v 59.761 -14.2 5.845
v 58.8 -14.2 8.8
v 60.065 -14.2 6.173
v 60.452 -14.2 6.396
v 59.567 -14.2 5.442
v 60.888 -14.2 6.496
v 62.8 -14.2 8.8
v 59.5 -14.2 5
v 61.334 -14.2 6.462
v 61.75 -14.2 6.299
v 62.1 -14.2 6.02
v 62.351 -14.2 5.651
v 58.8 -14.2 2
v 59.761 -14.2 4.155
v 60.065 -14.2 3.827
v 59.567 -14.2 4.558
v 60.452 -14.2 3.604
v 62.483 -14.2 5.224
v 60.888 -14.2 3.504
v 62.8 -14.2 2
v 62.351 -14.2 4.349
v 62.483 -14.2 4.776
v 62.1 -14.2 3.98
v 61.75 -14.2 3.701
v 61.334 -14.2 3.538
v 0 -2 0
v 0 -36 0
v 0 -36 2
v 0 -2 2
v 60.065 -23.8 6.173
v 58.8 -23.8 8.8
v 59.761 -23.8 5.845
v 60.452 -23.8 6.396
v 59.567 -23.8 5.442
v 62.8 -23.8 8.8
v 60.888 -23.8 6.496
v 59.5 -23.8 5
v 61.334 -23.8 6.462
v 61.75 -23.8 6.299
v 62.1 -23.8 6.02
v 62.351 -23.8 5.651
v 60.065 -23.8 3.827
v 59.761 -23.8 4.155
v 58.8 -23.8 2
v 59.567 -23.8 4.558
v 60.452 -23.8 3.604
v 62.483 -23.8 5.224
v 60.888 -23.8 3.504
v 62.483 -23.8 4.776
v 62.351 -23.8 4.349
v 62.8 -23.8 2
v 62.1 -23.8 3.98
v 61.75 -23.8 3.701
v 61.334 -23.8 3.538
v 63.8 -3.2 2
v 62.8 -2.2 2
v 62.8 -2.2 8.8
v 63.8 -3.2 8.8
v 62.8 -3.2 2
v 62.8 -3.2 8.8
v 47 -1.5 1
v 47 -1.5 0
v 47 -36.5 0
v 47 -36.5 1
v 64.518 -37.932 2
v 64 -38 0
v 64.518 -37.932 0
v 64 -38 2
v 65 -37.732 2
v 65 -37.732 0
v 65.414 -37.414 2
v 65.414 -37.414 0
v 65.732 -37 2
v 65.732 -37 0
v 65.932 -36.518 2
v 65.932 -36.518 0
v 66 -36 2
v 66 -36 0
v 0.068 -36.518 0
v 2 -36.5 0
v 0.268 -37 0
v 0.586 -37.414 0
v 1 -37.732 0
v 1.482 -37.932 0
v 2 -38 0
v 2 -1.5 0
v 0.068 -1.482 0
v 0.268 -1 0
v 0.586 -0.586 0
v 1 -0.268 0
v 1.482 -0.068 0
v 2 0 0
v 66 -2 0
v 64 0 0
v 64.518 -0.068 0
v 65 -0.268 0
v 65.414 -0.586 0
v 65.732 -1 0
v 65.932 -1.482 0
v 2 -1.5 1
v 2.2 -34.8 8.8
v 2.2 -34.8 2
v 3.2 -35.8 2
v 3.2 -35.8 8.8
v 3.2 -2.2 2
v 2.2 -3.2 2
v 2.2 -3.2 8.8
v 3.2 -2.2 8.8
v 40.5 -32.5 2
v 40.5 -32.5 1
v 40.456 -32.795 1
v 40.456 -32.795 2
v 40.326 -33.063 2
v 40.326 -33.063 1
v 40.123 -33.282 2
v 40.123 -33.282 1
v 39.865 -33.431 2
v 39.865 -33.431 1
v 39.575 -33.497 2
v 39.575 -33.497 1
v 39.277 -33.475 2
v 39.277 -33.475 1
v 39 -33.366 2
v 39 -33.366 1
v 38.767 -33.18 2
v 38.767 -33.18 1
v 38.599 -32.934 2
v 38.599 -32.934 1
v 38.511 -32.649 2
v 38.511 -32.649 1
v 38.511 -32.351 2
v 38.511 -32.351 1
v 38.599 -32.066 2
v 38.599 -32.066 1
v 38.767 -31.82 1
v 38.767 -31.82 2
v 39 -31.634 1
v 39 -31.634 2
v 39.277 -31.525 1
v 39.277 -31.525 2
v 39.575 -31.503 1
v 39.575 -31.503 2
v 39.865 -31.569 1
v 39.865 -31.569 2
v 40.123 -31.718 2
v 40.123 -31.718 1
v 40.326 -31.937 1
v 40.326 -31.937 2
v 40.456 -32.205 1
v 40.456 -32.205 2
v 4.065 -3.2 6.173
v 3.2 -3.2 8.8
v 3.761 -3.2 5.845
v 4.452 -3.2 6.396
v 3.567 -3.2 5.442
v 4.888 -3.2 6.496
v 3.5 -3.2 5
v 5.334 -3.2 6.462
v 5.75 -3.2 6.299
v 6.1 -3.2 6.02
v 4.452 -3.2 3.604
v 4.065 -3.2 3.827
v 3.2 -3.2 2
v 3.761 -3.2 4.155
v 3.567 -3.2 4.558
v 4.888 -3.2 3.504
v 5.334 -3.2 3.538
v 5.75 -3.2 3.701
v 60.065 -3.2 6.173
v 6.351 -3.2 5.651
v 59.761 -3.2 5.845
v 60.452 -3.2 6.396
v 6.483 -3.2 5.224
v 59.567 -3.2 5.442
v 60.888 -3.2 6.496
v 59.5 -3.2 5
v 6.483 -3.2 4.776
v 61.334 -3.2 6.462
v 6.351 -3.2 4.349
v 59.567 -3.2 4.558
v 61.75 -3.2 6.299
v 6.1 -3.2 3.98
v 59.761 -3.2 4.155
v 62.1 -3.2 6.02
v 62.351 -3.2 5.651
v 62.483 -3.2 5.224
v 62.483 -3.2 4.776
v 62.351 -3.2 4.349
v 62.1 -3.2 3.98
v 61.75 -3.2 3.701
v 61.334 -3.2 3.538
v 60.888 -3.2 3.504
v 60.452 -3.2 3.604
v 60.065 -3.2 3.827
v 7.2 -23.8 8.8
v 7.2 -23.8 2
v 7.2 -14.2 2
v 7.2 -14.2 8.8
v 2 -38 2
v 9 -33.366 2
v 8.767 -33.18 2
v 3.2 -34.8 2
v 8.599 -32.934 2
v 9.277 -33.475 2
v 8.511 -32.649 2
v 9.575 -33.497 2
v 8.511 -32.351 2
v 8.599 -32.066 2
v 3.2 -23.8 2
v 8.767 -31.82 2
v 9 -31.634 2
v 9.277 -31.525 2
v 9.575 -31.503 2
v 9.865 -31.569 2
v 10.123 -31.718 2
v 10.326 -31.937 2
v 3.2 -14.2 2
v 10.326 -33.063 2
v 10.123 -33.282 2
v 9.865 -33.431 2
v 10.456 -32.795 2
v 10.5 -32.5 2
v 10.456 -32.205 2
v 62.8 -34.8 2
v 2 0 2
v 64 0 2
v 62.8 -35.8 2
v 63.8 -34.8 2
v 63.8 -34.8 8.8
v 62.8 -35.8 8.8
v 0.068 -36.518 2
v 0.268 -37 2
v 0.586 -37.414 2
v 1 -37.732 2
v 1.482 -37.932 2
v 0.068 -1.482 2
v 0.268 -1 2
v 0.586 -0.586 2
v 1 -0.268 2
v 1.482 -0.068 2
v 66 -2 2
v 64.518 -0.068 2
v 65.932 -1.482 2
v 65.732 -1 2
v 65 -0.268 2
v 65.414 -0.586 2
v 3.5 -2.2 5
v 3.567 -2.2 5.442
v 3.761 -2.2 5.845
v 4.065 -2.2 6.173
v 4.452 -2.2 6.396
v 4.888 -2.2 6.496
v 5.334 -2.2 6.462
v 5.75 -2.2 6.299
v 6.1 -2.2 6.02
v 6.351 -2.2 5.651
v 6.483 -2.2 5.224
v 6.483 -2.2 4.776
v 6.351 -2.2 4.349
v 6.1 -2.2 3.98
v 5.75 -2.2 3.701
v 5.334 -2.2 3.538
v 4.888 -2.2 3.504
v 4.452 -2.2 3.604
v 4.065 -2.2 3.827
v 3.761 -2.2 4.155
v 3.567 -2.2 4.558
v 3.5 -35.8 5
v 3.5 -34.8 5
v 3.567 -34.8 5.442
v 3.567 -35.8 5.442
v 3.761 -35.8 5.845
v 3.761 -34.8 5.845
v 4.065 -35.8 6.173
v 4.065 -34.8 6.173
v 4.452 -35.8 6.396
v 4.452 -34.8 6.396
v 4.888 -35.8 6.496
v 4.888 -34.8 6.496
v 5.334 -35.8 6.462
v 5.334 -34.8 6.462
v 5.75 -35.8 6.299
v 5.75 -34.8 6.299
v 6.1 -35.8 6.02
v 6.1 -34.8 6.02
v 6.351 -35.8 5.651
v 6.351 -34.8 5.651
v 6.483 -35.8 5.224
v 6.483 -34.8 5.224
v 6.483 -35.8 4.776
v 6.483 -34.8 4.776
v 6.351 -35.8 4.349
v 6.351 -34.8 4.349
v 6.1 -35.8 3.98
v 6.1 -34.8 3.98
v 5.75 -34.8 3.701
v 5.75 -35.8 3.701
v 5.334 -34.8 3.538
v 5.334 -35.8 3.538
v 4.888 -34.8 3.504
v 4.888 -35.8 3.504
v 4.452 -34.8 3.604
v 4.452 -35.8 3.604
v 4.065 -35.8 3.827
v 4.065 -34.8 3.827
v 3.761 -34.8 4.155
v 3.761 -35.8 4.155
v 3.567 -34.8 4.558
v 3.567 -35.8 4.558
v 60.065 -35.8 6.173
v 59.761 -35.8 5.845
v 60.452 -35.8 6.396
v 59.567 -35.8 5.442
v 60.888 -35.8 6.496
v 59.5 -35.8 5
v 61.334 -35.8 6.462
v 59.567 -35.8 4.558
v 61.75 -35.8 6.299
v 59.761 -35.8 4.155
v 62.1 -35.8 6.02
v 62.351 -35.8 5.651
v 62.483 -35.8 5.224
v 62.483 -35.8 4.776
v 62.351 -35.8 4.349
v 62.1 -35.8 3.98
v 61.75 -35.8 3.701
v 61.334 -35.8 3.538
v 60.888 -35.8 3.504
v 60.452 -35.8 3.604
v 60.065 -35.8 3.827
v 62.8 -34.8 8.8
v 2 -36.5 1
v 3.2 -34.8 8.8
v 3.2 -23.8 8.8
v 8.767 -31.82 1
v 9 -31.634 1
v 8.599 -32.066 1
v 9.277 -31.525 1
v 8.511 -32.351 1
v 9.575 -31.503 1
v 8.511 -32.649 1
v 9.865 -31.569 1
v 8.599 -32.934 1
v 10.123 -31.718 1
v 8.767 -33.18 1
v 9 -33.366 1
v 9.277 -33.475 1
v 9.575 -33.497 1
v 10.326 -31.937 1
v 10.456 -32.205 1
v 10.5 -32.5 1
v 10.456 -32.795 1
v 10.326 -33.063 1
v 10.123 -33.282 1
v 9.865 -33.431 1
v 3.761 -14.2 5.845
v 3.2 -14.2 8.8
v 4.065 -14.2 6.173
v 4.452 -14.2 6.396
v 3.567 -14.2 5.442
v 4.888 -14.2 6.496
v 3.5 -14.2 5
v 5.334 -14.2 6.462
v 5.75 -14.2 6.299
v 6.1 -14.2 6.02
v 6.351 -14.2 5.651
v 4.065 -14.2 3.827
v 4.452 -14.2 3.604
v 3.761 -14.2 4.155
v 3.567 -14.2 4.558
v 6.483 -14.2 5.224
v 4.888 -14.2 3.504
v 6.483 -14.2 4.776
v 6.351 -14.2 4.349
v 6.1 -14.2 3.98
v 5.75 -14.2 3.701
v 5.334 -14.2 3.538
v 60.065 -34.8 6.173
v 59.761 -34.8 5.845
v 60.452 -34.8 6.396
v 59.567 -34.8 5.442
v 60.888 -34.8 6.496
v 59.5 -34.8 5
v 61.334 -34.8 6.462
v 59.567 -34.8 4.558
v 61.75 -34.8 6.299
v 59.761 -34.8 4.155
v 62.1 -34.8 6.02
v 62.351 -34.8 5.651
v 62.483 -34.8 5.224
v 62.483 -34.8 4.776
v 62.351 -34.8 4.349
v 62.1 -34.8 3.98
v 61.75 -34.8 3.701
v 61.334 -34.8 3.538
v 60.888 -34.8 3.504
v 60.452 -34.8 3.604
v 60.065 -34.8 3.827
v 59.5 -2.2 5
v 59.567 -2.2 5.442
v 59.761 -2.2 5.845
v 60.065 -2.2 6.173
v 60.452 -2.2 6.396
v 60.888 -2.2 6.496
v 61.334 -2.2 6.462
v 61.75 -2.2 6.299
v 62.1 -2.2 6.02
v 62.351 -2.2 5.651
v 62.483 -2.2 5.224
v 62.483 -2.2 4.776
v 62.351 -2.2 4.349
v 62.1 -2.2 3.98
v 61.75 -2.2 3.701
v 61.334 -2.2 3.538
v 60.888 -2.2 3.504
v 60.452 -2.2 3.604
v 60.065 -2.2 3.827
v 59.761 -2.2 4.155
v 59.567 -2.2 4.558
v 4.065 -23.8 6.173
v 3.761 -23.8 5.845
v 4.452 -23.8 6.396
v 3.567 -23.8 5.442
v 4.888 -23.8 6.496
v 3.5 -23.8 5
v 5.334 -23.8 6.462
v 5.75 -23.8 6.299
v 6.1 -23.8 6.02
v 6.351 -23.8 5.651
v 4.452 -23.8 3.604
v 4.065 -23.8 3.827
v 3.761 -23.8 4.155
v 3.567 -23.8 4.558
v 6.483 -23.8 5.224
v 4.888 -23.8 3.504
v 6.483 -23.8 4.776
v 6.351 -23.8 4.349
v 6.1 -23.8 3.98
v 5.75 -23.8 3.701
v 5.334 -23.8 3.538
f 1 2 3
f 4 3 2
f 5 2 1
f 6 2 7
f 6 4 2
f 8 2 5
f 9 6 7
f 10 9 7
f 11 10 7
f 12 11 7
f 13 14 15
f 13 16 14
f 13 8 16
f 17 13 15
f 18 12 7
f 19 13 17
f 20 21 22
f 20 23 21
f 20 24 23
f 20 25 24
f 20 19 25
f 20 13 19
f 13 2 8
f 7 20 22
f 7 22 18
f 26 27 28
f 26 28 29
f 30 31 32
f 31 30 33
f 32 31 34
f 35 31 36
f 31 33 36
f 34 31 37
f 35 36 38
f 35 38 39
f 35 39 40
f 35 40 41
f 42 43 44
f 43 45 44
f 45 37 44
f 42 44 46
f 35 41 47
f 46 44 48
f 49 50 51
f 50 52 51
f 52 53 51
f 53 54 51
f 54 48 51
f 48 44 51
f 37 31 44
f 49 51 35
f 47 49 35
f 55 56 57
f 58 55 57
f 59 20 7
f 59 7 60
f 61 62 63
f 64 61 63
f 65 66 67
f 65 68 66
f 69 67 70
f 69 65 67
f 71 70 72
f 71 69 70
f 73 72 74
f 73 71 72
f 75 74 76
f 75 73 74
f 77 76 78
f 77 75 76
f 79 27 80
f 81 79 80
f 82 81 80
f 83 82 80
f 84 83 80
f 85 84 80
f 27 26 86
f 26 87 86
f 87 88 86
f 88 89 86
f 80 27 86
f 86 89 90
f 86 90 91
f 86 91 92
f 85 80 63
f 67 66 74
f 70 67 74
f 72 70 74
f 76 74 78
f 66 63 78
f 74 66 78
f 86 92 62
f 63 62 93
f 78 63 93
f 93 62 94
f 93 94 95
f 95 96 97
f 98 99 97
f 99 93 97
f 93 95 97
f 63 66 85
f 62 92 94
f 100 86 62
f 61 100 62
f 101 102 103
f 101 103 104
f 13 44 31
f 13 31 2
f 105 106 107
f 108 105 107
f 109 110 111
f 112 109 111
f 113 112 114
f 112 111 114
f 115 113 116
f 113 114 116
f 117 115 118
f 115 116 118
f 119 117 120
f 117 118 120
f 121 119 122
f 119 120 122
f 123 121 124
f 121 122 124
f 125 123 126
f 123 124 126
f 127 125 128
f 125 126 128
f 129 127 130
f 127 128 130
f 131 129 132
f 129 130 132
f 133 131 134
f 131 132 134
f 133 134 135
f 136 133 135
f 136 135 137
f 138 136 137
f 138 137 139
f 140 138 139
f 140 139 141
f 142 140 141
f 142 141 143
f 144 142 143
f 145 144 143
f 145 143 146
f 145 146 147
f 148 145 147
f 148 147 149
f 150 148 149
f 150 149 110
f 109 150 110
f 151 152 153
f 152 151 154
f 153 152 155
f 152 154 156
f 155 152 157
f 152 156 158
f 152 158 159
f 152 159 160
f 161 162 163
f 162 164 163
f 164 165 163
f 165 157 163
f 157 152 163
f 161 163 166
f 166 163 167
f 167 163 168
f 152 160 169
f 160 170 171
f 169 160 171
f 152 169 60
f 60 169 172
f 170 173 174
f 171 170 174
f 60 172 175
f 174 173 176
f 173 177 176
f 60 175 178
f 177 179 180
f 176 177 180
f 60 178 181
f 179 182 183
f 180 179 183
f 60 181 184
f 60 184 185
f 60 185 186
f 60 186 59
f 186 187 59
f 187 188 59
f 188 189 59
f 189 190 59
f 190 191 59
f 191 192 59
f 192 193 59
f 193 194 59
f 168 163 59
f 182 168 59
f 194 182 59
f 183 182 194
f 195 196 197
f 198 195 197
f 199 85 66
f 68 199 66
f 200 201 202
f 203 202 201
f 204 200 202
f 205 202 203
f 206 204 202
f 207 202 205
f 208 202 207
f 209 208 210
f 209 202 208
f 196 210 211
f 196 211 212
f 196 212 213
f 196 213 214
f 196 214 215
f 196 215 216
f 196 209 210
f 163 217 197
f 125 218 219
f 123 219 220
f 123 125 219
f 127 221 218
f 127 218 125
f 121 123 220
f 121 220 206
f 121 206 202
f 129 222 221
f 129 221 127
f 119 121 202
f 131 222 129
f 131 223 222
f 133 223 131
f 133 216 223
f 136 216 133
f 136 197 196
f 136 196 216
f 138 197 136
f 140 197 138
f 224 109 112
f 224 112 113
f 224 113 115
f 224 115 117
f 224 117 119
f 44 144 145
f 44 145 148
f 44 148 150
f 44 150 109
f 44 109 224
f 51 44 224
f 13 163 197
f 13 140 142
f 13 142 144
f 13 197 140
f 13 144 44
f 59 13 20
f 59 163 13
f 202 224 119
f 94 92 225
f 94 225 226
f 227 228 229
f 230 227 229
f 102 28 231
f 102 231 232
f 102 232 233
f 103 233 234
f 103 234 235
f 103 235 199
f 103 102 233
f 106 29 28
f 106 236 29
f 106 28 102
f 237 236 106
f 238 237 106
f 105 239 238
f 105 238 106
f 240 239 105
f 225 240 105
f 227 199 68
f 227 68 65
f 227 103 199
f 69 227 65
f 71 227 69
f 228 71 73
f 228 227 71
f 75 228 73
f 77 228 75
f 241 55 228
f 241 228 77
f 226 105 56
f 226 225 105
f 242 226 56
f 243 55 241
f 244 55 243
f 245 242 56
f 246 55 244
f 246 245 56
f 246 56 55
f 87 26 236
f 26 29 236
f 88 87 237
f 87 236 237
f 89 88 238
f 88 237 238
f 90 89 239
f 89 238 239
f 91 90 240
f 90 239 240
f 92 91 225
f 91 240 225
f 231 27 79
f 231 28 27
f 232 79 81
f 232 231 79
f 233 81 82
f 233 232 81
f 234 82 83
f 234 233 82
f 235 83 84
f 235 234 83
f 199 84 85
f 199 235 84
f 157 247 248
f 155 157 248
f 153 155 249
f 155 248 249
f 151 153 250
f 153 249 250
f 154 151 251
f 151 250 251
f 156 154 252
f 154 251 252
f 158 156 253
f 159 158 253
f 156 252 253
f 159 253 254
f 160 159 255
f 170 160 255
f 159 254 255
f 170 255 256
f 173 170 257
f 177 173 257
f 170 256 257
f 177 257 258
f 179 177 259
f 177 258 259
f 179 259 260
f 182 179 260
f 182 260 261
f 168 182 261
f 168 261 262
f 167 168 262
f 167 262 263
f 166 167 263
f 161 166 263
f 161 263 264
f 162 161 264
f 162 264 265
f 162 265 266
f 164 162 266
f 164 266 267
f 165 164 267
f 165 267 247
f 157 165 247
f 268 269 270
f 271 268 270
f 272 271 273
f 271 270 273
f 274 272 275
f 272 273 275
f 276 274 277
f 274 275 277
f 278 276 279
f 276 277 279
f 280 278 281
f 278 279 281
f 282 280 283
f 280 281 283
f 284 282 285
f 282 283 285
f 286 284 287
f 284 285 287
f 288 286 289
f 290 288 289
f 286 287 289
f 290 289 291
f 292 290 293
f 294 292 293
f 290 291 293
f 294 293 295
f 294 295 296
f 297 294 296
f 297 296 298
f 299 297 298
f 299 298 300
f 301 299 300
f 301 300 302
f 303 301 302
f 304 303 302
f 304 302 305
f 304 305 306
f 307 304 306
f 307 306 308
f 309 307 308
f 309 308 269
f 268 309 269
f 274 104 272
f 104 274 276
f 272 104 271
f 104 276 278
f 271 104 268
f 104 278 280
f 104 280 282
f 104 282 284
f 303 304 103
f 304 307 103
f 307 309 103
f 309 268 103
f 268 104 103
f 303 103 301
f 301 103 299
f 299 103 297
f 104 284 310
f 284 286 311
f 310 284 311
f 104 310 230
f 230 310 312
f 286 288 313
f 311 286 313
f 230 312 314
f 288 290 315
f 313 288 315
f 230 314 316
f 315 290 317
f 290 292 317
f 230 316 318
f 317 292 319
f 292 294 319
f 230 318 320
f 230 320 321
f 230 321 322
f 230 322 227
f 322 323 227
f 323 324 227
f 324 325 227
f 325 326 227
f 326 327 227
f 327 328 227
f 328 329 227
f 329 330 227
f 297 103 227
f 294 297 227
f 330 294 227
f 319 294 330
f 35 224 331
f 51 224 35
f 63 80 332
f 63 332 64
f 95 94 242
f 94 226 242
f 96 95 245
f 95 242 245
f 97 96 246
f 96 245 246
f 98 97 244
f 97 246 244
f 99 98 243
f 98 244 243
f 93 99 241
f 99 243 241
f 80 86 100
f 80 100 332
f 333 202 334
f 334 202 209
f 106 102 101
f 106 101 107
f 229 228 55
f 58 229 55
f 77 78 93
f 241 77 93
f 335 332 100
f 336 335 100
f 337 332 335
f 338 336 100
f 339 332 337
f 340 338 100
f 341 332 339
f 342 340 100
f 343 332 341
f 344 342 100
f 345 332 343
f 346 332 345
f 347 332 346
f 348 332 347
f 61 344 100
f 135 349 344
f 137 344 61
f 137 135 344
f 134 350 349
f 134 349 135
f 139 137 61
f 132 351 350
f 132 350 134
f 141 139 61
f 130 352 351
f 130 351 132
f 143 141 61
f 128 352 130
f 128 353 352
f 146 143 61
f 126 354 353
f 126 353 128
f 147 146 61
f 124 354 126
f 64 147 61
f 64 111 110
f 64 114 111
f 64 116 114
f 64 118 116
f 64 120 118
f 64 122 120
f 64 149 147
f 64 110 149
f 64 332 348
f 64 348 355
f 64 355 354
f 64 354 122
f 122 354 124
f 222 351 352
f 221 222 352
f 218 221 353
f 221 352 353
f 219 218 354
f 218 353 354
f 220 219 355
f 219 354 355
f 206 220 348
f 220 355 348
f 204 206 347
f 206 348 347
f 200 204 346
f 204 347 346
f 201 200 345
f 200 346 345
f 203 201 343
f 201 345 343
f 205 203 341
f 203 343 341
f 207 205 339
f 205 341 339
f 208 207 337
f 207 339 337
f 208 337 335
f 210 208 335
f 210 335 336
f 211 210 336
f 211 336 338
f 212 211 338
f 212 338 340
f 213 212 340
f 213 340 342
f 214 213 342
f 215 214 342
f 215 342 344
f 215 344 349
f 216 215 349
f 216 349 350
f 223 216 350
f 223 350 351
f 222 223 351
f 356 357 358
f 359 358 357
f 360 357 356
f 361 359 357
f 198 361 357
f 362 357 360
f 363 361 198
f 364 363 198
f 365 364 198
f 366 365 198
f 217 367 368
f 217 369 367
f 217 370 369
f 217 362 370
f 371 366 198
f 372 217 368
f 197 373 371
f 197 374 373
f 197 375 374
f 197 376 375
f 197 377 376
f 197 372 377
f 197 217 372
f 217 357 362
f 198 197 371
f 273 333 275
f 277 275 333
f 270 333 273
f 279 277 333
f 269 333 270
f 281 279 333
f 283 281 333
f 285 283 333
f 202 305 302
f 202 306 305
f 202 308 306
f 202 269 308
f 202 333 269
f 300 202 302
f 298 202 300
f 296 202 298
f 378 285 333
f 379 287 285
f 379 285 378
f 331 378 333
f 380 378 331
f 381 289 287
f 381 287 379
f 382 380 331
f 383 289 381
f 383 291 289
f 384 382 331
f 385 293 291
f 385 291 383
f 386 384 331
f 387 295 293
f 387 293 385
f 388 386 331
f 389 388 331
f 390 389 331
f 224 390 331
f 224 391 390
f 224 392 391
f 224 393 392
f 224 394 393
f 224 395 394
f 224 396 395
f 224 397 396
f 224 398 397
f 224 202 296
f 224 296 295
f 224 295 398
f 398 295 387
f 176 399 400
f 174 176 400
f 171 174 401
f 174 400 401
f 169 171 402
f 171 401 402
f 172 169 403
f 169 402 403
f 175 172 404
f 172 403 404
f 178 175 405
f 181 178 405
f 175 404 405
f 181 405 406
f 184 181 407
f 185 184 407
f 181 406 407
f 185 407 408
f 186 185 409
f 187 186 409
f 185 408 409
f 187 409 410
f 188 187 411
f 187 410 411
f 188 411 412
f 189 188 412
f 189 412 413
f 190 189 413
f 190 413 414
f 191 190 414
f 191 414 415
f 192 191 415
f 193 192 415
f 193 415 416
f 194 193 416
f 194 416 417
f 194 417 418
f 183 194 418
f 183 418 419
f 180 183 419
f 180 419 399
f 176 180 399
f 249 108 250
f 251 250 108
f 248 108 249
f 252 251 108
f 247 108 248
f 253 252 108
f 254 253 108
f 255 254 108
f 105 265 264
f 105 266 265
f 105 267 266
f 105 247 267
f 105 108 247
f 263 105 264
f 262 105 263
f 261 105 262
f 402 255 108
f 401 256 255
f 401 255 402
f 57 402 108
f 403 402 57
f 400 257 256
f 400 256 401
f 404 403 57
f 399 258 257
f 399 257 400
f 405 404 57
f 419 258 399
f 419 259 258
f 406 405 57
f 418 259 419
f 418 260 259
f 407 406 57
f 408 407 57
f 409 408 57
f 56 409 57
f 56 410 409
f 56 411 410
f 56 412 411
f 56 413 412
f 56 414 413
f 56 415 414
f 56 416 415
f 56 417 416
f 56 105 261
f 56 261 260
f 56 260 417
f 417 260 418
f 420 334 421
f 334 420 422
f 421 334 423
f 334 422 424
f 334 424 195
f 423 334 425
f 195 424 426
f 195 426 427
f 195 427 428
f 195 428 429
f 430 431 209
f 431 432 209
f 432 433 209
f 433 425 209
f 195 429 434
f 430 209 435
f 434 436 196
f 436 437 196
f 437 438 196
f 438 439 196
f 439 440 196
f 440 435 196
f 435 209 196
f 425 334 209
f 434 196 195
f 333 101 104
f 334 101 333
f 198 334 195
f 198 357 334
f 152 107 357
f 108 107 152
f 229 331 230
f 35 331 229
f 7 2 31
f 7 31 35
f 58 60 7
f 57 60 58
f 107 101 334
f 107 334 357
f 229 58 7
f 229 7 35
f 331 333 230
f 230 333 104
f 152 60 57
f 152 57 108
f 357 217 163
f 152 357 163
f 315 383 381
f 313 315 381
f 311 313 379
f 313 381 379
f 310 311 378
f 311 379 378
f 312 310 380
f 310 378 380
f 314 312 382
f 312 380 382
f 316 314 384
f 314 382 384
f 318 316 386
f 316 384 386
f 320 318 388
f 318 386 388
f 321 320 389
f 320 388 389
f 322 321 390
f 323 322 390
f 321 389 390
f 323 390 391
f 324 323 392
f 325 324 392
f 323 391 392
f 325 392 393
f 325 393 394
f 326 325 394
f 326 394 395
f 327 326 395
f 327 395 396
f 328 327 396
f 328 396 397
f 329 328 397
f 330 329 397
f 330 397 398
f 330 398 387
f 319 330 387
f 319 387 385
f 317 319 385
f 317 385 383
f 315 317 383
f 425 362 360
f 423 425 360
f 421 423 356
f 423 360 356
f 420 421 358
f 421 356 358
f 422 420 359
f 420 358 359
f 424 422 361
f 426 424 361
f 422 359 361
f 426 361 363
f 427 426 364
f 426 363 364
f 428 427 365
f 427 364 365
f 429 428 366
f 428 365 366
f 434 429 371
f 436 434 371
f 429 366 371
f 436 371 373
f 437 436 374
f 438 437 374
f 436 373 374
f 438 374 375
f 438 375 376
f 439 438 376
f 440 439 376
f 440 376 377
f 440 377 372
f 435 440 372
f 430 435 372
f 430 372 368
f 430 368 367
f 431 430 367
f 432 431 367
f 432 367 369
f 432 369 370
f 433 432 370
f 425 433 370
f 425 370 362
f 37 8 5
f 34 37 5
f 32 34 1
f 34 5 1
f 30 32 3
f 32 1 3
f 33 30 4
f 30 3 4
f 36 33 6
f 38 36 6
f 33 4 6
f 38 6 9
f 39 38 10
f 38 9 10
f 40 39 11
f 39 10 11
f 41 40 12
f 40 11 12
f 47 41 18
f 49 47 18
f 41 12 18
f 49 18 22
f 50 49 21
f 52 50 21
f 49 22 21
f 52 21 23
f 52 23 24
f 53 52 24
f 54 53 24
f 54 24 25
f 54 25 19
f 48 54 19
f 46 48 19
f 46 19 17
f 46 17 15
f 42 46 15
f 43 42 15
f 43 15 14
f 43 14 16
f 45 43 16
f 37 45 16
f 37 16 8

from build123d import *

# Parameters (mm, degrees)
F0_W      = 66
F0_H      = 38
F1_DEPTH  = 2
F2_W      = 61.6
F2_H      = 33.6
F2_W_2    = 59.6
F2_H_2    = 31.6
F3_DEPTH  = 6.8
F4_R      = 2
F5_W      = 45
F5_H      = 35
F6_DEPTH  = 1
F7_R      = 1
F8_DEPTH  = 8.801
F9_W      = 4
F9_H      = 9.6
F10_DEPTH = 6.8
F11_R     = 1.5
F12_DEPTH = 35.801
F13_SIZE  = 1


with BuildPart() as f1:
    # F0 (on Top) → F1 (new body)
    with BuildSketch(Plane.XY):
        with Locations((33, -19)):
            Rectangle(F0_W, F0_H)
    extrude(amount=F1_DEPTH)

    # F2 (on face) → F3 (join)
    with BuildSketch(Plane.XY.offset(2)):
        with Locations((33, -19)):
            Rectangle(F2_W, F2_H)
        with Locations((33, -19)):
            Rectangle(F2_W_2, F2_H_2, mode=Mode.SUBTRACT)
    extrude(amount=F3_DEPTH)

    # F4
    f4_edges = [f1.edges().sort_by_distance(p)[0] for p in [
        (0, -38, 1),
        (0, 0, 1),
        (66, -38, 1),
        (66, 0, 1),
    ]]
    fillet(f4_edges, radius=F4_R)

    # F5 (on face) → F6 (cut)
    with BuildSketch(Plane(origin=(0, 0, 0), x_dir=(1, 0, 0), z_dir=(0, 0, -1))):
        with Locations((24.5, 19)):
            Rectangle(F5_W, F5_H)
    extrude(amount=-F6_DEPTH, mode=Mode.SUBTRACT)

    # F7 (on face) → F8 (cut, through all)
    with BuildSketch(Plane(origin=(0, 0, 0), x_dir=(1, 0, 0), z_dir=(0, 0, -1))):
        with Locations((9.5, 32.5)):
            Circle(F7_R)
        with Locations((39.5, 32.5)):
            Circle(F7_R)
    extrude(amount=-F8_DEPTH, mode=Mode.SUBTRACT)

    # F9 (on face) → F10 (join)
    with BuildSketch(Plane.XY.offset(2)):
        with Locations((5.2, -19)):
            Rectangle(F9_W, F9_H)
        with Locations((60.8, -19)):
            Rectangle(F9_W, F9_H)
    extrude(amount=F10_DEPTH)

    # F11 (on face) → F12 (cut, through all)
    with BuildSketch(Plane(origin=(0, -2.2, 0), x_dir=(-1, 0, 0), z_dir=(0, 1, 0))):
        with Locations((-61, 5)):
            Circle(F11_R)
        with Locations((-5, 5)):
            Circle(F11_R)
    extrude(amount=-F12_DEPTH, mode=Mode.SUBTRACT)

    # F13
    f13_edges = [f1.edges().sort_by_distance(p)[0] for p in [
        (2.2, -2.2, 5.4),
        (2.2, -35.8, 5.4),
        (63.8, -35.8, 5.4),
        (63.8, -2.2, 5.4),
    ]]
    chamfer(f13_edges, length=F13_SIZE)


solid = f1.part
